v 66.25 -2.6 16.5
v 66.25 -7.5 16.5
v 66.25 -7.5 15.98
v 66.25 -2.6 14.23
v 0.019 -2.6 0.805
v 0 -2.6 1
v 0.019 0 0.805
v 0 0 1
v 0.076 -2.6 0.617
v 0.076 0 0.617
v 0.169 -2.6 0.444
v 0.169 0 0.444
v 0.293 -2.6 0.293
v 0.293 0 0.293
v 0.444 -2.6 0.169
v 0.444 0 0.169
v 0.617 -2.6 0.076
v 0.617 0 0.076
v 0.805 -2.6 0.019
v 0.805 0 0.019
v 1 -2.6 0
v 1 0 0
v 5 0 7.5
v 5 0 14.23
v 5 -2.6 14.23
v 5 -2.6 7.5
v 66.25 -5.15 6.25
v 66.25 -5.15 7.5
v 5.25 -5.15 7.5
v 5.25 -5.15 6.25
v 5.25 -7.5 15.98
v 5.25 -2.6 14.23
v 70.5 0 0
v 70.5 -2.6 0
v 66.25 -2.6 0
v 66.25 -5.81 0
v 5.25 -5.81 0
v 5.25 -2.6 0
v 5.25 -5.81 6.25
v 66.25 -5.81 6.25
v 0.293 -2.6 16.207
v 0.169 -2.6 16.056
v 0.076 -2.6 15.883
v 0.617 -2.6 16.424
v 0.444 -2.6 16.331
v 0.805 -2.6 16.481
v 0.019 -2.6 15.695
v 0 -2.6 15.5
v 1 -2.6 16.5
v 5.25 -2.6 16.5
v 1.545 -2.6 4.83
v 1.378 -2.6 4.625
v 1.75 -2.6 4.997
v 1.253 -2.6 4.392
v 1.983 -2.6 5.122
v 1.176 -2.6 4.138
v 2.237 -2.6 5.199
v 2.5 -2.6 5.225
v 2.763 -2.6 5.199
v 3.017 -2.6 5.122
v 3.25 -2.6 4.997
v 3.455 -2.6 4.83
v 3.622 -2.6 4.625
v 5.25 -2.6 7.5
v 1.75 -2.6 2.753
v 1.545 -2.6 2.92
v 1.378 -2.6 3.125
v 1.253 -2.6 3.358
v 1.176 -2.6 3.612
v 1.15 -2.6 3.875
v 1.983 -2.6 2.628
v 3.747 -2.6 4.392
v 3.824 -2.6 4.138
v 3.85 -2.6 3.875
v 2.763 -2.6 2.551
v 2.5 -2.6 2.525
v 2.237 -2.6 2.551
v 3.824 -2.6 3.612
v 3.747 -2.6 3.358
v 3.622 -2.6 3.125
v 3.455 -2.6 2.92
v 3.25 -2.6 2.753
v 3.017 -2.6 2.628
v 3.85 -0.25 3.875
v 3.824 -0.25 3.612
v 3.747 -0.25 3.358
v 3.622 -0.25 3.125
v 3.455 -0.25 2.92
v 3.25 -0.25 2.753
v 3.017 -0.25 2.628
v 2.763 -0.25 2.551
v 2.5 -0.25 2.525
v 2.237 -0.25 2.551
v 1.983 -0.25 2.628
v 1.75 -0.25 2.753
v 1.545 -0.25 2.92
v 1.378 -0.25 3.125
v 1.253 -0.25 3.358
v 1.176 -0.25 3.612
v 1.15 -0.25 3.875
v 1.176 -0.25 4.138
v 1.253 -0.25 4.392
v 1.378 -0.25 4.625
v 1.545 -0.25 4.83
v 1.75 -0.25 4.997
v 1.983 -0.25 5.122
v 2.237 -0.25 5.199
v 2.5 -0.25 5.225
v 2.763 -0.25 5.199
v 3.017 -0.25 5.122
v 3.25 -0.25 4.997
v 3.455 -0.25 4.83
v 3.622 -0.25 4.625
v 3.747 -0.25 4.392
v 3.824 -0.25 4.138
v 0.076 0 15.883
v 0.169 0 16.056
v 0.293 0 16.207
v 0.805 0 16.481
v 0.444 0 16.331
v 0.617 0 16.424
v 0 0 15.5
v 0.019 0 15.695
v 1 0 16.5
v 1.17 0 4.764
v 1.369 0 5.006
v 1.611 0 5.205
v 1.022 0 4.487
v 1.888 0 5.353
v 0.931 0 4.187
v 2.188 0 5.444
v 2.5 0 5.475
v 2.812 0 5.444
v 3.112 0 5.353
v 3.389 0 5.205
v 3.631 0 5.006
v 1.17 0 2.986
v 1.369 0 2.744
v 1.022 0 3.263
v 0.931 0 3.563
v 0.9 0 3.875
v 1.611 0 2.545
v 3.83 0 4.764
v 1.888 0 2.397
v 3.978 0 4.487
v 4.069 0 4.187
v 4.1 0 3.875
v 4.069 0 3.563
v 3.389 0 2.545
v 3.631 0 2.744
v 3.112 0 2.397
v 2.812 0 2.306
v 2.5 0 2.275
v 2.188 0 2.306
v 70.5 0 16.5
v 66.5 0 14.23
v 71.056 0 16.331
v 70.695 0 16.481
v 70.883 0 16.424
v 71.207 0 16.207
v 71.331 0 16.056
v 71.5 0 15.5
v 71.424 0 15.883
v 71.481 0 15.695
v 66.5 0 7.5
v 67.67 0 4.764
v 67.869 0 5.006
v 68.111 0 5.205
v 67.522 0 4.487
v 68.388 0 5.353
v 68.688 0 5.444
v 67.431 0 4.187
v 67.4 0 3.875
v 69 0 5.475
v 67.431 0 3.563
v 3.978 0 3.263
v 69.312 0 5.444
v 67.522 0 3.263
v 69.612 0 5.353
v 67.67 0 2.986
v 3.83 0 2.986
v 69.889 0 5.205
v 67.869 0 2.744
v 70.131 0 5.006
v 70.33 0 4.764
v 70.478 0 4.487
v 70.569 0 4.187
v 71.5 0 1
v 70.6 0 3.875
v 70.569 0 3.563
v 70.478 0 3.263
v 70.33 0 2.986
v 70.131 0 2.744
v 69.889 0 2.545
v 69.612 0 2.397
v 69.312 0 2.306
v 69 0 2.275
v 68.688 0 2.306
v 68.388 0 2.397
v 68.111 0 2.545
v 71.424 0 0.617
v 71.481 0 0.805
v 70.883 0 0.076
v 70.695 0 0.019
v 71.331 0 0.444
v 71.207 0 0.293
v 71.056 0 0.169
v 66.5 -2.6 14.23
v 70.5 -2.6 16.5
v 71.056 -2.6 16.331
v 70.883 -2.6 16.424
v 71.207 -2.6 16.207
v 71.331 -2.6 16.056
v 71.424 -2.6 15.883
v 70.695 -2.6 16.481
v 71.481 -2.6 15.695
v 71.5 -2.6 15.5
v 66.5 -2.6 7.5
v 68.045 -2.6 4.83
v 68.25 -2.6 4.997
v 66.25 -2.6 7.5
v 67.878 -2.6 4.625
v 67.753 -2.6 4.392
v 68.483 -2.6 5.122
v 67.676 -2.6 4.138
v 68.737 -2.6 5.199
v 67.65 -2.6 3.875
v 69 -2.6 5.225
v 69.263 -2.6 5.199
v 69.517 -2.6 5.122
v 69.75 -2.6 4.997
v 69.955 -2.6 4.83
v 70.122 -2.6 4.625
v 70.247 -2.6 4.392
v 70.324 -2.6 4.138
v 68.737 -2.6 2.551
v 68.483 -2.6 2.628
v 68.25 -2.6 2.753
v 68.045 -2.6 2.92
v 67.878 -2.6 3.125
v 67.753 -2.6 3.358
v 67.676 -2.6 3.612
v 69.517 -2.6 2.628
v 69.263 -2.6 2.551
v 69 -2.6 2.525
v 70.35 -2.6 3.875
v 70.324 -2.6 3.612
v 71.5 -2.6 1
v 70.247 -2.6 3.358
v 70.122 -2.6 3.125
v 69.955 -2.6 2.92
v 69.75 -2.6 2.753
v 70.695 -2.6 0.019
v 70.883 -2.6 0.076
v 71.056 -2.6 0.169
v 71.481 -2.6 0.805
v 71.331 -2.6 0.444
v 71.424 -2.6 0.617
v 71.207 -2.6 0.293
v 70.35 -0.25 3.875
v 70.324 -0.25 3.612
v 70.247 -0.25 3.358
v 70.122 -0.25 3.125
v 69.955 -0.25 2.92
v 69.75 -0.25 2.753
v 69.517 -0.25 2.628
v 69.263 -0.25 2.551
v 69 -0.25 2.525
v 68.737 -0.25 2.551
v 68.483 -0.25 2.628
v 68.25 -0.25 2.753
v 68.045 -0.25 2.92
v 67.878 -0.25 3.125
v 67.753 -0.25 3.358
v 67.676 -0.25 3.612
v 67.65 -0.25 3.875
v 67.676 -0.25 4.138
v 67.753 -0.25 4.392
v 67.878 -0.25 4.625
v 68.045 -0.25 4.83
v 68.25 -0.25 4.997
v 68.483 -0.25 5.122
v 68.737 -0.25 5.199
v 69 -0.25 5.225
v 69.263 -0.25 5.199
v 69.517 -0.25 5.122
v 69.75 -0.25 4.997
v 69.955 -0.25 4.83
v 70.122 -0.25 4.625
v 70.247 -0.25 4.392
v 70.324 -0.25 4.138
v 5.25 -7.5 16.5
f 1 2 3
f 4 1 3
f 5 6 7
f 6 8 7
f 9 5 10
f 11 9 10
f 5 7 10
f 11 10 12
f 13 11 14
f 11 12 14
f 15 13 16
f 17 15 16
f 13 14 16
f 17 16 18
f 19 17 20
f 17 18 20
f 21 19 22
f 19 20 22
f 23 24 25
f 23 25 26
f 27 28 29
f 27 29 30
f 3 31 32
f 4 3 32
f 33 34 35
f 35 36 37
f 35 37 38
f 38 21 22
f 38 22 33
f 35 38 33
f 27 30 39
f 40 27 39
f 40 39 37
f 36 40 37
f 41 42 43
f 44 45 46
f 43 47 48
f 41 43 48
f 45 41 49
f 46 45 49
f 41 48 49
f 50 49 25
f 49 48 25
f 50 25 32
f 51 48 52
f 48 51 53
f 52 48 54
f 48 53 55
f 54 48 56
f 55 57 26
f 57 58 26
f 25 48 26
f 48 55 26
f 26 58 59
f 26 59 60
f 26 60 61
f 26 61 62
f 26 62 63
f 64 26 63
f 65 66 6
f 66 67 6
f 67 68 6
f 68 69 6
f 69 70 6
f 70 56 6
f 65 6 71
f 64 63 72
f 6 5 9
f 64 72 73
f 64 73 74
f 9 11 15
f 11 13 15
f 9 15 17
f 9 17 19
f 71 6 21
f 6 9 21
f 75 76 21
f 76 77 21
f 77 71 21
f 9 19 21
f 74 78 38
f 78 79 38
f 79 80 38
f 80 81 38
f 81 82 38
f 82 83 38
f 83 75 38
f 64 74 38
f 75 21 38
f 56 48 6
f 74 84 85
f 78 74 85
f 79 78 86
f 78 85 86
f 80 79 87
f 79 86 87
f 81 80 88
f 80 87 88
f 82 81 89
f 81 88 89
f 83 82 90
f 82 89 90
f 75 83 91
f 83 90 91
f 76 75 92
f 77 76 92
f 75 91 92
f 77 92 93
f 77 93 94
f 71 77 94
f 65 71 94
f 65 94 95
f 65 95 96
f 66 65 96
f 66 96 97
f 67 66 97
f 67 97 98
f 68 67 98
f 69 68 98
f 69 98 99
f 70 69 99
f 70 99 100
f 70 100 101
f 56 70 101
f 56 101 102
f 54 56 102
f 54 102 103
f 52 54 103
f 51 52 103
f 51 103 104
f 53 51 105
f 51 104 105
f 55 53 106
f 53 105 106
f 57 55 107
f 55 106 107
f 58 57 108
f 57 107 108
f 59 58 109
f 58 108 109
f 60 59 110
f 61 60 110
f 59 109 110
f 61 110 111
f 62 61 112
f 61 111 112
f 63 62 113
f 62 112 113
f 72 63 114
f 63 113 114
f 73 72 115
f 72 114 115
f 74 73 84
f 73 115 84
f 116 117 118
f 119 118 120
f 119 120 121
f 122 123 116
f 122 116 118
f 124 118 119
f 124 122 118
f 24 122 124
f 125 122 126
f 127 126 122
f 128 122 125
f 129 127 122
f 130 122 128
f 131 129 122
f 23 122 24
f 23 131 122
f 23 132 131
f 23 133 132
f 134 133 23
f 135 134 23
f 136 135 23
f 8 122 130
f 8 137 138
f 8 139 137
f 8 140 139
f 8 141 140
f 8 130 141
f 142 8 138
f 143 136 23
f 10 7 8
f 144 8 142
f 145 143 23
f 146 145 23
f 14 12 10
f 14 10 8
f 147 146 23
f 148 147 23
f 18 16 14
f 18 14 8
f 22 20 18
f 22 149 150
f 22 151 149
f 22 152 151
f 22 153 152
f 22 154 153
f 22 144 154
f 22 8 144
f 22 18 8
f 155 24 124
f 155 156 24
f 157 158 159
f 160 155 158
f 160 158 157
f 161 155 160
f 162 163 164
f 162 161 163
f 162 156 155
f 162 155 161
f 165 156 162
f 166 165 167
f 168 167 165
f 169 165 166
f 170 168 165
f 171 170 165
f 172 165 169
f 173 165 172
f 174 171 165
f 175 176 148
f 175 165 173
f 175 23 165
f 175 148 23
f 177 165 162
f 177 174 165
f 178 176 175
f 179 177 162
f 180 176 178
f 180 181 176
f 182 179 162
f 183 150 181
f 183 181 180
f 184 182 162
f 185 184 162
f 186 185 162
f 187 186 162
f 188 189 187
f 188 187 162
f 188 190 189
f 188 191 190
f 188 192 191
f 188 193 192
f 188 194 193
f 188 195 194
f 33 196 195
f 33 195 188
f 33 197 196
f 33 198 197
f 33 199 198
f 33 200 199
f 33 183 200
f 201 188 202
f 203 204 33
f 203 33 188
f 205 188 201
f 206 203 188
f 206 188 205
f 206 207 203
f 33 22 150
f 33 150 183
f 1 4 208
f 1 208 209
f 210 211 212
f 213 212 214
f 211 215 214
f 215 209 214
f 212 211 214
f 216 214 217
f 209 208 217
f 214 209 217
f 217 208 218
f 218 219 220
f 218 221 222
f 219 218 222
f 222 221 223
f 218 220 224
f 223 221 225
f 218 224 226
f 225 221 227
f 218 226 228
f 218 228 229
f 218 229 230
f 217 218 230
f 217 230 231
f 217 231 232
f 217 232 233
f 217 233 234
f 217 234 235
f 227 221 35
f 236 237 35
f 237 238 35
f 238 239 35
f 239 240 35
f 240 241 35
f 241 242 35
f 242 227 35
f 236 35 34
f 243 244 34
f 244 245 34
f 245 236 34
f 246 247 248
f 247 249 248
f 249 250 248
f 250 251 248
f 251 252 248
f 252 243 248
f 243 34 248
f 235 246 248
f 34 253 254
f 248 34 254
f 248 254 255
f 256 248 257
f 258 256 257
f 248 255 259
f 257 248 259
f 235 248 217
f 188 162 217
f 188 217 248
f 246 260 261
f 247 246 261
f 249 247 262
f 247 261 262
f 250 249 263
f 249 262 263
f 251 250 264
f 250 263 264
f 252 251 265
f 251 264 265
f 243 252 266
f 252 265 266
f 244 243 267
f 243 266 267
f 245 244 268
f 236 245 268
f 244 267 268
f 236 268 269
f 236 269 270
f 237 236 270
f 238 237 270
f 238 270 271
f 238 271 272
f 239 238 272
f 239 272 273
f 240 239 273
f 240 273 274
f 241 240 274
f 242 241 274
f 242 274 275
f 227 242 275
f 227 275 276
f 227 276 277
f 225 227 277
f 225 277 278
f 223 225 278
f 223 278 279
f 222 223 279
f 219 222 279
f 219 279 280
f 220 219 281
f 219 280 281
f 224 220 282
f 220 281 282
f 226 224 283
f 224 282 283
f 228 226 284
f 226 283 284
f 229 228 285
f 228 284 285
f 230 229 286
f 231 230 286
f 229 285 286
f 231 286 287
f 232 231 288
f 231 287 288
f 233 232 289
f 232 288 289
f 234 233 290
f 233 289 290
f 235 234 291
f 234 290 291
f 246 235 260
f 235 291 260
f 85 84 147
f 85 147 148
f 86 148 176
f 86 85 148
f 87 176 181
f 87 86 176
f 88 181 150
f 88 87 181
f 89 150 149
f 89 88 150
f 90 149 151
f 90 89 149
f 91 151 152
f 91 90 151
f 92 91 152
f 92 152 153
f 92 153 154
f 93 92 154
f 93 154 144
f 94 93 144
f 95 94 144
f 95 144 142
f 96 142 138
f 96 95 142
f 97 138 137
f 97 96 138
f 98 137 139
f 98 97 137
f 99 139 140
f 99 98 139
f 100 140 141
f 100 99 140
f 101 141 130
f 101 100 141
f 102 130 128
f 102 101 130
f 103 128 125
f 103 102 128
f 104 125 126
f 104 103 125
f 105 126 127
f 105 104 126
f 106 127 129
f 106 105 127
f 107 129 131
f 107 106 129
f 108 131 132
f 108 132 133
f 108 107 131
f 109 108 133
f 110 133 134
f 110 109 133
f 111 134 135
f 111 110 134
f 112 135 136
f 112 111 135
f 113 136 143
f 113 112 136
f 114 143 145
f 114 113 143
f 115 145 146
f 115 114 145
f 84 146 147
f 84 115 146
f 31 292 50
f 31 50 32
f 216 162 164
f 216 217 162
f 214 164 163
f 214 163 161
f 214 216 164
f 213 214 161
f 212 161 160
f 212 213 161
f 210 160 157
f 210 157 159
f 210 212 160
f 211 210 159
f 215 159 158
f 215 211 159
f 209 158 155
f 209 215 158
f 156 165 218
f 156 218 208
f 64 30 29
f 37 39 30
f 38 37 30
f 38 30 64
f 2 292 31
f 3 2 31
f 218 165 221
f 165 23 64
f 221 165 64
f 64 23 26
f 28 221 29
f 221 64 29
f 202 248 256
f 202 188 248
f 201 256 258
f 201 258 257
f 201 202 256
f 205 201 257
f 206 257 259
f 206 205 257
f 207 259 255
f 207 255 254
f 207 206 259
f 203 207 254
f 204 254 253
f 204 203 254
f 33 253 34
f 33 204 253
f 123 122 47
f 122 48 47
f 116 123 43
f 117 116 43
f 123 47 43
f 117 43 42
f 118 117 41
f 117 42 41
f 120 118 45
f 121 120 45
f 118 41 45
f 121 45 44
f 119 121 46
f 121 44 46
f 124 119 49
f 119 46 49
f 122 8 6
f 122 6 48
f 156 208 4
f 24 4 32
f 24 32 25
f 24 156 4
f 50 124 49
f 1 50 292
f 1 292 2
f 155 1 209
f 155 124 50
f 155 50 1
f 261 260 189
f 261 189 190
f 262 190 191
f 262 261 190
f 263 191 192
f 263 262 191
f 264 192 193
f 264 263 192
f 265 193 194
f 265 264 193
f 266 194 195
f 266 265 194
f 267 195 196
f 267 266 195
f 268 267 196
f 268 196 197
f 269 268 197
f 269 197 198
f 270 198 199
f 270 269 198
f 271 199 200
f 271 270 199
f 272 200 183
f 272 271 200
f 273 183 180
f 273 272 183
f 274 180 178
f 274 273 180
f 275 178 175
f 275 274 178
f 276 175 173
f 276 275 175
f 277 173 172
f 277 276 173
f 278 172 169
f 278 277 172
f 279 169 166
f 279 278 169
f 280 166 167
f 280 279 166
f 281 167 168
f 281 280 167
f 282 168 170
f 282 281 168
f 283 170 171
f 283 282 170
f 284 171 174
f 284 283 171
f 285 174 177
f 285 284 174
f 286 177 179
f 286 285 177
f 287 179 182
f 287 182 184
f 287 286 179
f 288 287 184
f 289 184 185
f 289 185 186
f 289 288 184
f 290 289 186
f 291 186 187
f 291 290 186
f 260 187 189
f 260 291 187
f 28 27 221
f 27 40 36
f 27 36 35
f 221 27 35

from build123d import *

# Parameters (mm, degrees)
BOSS_EXTRUDE1_DEPTH = 71.5
SKETCH2_R           = 1.35
CUT_EXTRUDE1_DEPTH  = 6.81
BOSS_EXTRUDE2_DEPTH = 2.6
BOSS_EXTRUDE3_DEPTH = 61
SKETCH5_W           = 5.25
SKETCH5_H           = 3.21
CUT_EXTRUDE2_DEPTH  = 17.5
FILLET1_R           = 1
CHAMFER1_SIZE       = 0.25


with BuildPart() as part:
    # Sketch1 → Boss-Extrude1 (new body)
    with BuildSketch(Plane(origin=(0, 0, 0), x_dir=(0, 0, -1), z_dir=(1, 0, 0))):
        Polygon((0, 0), (-7.5, 0), (-7.5, -5.15), (-6.25, -5.15), (-6.25, -5.81), (0, -5.81), align=None)
    extrude(amount=BOSS_EXTRUDE1_DEPTH)

    # Sketch2 → Cut-Extrude1 (cut, through all)
    with BuildSketch(Plane(origin=(0, 0, 0), x_dir=(1, 0, 0), z_dir=(0, 1, 0))):
        with Locations((2.5, -3.875)):
            Circle(SKETCH2_R)
        with Locations((69, -3.875)):
            Circle(SKETCH2_R)
    extrude(amount=-CUT_EXTRUDE1_DEPTH, mode=Mode.SUBTRACT)

    # Sketch3 → Boss-Extrude2 (add)
    with BuildSketch(Plane(origin=(0, 0, 0), x_dir=(1, 0, 0), z_dir=(0, 1, 0))):
        Polygon((0, -7.5), (0, -16.5), (71.5, -16.5), (71.5, -7.5), (66.5, -7.5), (66.5, -14.23), (5, -14.23), (5, -7.5), align=None)
    extrude(amount=-BOSS_EXTRUDE2_DEPTH)

    # Sketch4 → Boss-Extrude3 (add)
    with BuildSketch(Plane.ZY.offset(-5.25)):
        Polygon((16.5, -2.6), (16.5, -7.5), (15.98, -7.5), (14.23, -2.6), align=None)
    extrude(amount=-BOSS_EXTRUDE3_DEPTH)

    # Sketch5 → Cut-Extrude2 (cut, through all)
    with BuildSketch(Plane(origin=(0, 0, 0), x_dir=(-1, 0, 0), z_dir=(0, 0, -1))):
        with Locations((-2.625, -4.205)):
            Rectangle(SKETCH5_W, SKETCH5_H)
        with Locations((-68.875, -4.205)):
            Rectangle(SKETCH5_W, SKETCH5_H)
    extrude(amount=-CUT_EXTRUDE2_DEPTH, mode=Mode.SUBTRACT)

    # Fillet1
    fillet1_edges = [part.edges().sort_by_distance(p)[0] for p in [
        (71.5, -1.3, 16.5),
        (0, -1.3, 16.5),
        (0, -1.3, 0),
        (71.5, -1.3, 0),
    ]]
    fillet(fillet1_edges, radius=FILLET1_R)

    # Chamfer1
    chamfer1_edges = [part.edges().sort_by_distance(p)[0] for p in [
        (1.15, 0, 3.875),
        (67.65, 0, 3.875),
    ]]
    chamfer(chamfer1_edges, length=CHAMFER1_SIZE)


solid = part.part
